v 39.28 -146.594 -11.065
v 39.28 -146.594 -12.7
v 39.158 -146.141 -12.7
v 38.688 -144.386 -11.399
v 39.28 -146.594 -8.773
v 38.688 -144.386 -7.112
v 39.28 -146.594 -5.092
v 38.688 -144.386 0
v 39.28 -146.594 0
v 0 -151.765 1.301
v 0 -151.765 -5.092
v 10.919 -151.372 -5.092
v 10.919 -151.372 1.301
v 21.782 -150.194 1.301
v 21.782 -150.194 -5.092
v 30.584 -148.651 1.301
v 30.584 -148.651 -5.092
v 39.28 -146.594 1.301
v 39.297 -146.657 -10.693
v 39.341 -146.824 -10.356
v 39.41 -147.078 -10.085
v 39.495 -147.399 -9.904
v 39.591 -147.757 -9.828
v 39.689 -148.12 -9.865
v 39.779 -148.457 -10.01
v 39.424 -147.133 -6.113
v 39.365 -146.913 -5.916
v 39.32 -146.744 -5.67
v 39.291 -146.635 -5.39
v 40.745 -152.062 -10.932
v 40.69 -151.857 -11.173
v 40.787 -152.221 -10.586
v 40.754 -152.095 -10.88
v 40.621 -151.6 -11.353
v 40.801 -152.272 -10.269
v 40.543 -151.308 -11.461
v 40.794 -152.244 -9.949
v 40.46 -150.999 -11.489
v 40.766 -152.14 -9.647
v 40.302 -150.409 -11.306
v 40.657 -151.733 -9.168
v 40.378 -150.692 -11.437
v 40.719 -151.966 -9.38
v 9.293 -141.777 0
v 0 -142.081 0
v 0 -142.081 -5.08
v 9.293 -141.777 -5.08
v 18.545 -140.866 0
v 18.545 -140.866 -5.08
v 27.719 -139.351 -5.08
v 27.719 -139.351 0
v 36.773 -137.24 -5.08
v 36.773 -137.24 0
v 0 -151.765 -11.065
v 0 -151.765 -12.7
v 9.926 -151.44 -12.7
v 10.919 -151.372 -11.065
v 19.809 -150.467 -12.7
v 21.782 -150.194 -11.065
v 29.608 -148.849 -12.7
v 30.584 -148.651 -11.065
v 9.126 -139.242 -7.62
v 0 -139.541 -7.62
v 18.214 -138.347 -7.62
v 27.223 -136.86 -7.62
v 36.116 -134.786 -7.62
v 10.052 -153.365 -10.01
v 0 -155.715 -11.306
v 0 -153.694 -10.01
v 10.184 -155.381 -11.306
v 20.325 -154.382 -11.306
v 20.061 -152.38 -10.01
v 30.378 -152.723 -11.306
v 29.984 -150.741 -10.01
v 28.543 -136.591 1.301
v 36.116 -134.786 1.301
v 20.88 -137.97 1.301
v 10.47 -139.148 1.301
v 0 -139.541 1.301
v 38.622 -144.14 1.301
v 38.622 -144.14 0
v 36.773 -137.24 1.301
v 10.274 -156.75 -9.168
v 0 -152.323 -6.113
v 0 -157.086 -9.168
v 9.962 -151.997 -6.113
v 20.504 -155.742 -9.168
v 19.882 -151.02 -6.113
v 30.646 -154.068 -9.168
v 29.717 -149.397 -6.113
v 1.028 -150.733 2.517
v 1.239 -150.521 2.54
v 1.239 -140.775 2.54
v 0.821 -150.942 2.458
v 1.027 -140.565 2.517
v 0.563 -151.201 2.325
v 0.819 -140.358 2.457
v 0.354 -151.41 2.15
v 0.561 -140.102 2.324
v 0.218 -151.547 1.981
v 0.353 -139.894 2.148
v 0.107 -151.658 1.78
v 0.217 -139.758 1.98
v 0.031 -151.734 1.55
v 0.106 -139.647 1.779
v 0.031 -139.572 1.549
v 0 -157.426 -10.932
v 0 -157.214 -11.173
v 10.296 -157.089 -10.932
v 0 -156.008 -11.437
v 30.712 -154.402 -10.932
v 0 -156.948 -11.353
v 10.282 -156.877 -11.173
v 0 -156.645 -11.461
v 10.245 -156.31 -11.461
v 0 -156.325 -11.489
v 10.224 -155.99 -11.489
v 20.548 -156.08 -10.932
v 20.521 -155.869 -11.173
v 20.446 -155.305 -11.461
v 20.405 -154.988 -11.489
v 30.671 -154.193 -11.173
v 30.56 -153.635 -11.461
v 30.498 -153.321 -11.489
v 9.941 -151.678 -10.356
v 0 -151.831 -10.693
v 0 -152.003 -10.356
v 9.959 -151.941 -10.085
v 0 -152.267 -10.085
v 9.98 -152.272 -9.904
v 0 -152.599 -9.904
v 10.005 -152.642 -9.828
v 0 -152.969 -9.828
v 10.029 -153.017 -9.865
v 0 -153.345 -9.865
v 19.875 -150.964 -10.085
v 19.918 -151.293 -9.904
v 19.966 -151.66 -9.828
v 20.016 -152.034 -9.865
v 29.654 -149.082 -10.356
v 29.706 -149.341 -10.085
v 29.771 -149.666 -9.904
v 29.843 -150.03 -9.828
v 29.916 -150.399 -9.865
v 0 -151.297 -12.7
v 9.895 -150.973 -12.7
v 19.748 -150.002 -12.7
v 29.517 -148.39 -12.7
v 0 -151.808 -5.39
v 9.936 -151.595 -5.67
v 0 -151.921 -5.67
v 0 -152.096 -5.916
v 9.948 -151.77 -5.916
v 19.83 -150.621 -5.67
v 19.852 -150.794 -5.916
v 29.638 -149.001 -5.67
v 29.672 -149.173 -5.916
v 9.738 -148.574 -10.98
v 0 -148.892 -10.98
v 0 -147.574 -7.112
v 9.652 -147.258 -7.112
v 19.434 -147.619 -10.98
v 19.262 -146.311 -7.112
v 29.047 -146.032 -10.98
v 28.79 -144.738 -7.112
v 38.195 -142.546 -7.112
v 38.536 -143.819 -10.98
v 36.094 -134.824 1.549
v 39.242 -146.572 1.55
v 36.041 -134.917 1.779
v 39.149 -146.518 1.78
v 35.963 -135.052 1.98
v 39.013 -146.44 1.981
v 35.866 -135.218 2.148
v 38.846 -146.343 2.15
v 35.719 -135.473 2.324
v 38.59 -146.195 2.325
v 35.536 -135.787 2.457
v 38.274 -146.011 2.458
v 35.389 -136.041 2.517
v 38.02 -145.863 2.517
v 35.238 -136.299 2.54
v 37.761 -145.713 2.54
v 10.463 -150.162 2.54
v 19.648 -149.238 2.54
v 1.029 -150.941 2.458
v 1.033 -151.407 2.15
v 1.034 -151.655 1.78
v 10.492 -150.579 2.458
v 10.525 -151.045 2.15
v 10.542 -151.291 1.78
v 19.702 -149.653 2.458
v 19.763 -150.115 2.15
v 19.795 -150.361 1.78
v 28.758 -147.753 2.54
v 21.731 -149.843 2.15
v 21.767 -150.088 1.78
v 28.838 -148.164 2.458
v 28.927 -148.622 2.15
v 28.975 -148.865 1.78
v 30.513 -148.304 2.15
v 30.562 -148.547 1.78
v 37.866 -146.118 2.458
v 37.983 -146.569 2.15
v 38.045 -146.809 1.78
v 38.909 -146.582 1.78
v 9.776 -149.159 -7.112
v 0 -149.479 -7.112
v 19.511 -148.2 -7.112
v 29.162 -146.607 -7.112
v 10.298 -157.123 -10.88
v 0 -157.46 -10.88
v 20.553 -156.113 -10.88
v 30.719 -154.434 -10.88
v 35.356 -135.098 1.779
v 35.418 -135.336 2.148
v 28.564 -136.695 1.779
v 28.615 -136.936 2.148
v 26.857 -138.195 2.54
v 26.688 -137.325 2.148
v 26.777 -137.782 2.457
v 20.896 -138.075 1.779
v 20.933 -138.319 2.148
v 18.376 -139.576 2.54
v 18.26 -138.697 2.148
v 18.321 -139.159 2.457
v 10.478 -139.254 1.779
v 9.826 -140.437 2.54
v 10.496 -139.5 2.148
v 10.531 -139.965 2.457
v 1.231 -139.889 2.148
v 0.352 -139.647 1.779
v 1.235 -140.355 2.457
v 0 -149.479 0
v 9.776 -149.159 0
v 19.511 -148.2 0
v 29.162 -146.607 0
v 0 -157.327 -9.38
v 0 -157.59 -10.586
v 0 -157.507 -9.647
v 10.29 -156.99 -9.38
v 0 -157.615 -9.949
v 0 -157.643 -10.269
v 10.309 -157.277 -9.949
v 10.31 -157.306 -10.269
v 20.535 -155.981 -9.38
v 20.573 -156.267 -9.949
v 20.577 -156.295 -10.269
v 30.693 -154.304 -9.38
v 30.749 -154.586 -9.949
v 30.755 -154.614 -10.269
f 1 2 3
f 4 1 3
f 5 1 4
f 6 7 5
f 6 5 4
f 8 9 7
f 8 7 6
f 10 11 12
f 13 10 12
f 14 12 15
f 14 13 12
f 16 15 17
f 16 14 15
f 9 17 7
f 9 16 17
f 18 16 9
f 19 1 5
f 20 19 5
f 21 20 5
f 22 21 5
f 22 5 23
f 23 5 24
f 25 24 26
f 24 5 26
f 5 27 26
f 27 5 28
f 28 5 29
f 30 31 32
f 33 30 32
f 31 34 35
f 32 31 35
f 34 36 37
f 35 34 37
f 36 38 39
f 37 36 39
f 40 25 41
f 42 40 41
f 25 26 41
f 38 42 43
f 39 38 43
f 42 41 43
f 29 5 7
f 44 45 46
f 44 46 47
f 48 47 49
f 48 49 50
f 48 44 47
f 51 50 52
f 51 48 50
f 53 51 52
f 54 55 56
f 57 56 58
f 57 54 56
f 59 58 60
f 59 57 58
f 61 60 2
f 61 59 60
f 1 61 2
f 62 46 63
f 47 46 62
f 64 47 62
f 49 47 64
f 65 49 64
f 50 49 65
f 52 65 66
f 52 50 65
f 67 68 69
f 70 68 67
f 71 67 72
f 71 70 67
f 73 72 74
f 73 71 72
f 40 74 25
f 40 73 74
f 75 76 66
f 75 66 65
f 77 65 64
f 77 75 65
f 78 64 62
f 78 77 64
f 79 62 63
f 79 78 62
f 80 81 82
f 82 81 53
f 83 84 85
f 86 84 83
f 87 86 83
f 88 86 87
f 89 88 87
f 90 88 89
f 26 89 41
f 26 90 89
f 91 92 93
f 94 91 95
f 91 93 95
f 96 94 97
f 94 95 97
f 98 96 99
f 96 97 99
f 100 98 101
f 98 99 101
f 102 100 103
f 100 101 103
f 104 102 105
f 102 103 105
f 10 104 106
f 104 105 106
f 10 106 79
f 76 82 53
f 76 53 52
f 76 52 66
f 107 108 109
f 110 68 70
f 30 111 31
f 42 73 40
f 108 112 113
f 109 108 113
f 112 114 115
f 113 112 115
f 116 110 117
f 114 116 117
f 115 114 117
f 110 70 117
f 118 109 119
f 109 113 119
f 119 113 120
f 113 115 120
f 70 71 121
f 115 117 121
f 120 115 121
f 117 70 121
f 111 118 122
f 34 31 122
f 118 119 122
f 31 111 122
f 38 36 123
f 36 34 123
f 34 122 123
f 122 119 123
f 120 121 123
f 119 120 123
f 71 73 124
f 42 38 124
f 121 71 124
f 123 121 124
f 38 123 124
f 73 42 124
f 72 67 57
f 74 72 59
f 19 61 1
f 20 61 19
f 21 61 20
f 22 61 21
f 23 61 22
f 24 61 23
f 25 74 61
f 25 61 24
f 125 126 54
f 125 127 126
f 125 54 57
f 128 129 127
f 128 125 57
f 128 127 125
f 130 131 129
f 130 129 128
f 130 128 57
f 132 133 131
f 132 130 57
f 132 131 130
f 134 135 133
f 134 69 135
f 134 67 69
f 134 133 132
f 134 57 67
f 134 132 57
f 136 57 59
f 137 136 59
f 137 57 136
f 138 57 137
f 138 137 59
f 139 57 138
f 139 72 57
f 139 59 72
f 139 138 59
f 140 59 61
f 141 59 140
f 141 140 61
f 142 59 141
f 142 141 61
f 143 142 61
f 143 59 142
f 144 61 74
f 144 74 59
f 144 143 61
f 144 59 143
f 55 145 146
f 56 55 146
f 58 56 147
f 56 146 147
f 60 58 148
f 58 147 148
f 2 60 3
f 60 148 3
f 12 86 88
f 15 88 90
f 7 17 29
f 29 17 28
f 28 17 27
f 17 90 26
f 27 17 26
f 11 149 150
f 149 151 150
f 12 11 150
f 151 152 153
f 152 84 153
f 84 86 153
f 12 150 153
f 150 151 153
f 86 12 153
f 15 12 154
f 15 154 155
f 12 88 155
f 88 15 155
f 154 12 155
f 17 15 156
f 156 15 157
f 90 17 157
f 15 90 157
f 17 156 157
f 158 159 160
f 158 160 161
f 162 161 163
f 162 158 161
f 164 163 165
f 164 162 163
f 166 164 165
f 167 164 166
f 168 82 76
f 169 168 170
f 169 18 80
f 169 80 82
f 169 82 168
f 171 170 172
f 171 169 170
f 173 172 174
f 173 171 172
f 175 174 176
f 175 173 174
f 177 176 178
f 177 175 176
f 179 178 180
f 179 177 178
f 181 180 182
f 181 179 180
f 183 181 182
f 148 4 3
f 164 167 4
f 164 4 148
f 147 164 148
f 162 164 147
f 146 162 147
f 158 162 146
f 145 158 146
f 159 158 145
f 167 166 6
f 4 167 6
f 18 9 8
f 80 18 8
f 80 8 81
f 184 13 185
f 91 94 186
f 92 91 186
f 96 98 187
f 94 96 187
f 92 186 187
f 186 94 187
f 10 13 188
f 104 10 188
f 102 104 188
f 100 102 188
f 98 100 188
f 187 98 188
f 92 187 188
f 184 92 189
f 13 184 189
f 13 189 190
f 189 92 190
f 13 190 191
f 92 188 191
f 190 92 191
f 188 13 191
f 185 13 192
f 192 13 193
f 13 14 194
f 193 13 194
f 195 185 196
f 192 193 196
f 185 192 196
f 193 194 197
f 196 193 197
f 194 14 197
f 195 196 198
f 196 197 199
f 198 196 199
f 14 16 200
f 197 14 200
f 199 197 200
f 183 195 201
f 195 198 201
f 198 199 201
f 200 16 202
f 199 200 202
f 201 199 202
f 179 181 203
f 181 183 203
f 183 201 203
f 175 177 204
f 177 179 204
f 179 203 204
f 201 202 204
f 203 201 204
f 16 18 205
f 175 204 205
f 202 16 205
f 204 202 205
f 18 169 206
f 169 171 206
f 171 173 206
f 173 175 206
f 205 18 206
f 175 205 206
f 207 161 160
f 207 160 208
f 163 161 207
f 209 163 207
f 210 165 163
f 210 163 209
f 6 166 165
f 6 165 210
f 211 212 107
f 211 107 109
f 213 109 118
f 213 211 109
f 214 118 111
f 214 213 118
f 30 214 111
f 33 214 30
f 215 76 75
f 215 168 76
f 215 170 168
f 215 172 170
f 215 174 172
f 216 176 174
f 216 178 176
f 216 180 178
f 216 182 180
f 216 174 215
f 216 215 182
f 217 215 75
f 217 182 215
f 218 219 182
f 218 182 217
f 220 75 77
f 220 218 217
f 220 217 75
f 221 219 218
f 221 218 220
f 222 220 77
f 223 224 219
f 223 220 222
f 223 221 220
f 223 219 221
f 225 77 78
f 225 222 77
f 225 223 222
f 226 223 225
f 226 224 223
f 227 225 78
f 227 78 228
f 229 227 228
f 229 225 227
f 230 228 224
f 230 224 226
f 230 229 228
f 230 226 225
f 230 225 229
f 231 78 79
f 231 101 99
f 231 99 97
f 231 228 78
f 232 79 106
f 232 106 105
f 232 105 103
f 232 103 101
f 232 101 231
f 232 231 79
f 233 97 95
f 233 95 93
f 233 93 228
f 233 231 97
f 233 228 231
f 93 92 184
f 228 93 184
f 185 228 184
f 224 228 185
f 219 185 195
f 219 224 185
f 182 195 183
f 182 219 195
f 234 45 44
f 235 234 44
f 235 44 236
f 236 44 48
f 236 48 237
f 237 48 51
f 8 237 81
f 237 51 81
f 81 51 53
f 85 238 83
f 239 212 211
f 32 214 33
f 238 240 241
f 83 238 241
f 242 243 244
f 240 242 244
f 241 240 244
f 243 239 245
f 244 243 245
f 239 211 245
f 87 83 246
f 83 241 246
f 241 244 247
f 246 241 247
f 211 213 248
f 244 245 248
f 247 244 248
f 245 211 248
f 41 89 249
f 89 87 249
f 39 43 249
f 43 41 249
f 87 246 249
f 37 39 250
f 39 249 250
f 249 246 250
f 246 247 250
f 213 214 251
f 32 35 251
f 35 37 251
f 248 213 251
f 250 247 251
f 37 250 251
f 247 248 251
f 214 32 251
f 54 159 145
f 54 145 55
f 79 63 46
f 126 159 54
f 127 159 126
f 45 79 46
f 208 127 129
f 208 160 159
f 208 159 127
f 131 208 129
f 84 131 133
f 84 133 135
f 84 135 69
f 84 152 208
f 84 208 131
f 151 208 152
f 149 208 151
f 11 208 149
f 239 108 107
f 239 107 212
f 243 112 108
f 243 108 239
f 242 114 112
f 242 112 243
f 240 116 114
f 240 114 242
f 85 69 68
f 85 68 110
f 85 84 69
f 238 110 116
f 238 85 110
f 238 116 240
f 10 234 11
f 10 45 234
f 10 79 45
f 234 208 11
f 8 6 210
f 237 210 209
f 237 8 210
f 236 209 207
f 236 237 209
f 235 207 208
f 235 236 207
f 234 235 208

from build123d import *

# Parameters (mm, degrees)
F2_DEPTH      = 2.54
F3_DEPTH      = 7.62
F5_DEPTH      = 12.7
F7_ANGLE      = 15
F8_T2_ANGLE   = 20.2683164311
F8_T4_ANGLE   = 18.6436758241
F10_ANGLE     = 15
F11_T2_ANGLE  = 15
F11_T4_ANGLE  = 15
F11_T5_DEPTH  = 18.5785787418
F11_T7_DEPTH  = 18.5785787418
F11_T10_ANGLE = 17.3026091046
F11_T12_ANGLE = 17.3227523422
F11_T14_ANGLE = 17.3991627069
F11_T16_ANGLE = 17.6093282682


# Not quite as in the source:
# - a fillet or chamfer that OpenCascade refuses, or shapes differently, is made with other operations: its cross-section is extruded or revolved along the edge and cut away or added


with BuildPart() as f2:
    # F1 (on Top) → F2 (new body)
    with BuildSketch(Plane.XY):
        with BuildLine():
            ThreePointArc((36.1159330774, -134.7864972077), (18.2137880201, -138.3474552622), (0, -139.54125))
            Line((0, -139.54125), (0, -142.08125))
            ThreePointArc((0, -142.08125), (18.5453245484, -140.8657252101), (36.773333452, -137.2399488064))
            Line((36.773333452, -137.2399488064), (36.1159330774, -134.7864972077))
        make_face()
        with BuildLine():
            ThreePointArc((36.773333452, -137.2399488064), (18.5453245484, -140.8657252101), (0, -142.08125))
            Line((0, -142.08125), (0, -149.225))
            ThreePointArc((0, -149.225), (19.477771034, -147.9483594385), (38.6222720054, -144.140281428))
            Line((38.6222720054, -144.140281428), (36.773333452, -137.2399488064))
        make_face()
        with BuildLine():
            ThreePointArc((38.6222720054, -144.140281428), (19.477771034, -147.9483594385), (0, -149.225))
            Line((0, -149.225), (0, -151.765))
            ThreePointArc((0, -151.765), (19.8093075623, -150.4666293864), (39.27967238, -146.5937330268))
            Line((39.27967238, -146.5937330268), (38.6222720054, -144.140281428))
        make_face()
    extrude(amount=F2_DEPTH)

    # F1 (on Top) → F3 (join)
    with BuildSketch(Plane.XY):
        with BuildLine():
            ThreePointArc((36.1159330774, -134.7864972077), (18.2137880201, -138.3474552622), (0, -139.54125))
            Line((0, -139.54125), (0, -142.08125))
            ThreePointArc((0, -142.08125), (18.5453245484, -140.8657252101), (36.773333452, -137.2399488064))
            Line((36.773333452, -137.2399488064), (36.1159330774, -134.7864972077))
        make_face()
    extrude(amount=-F3_DEPTH)

    # F4 (on face) → F5 (join)
    with BuildSketch(Plane.XY):
        with BuildLine():
            ThreePointArc((38.6880120429, -144.3856265879), (19.5109246869, -148.2001864333), (0, -149.479))
            Line((0, -149.479), (0, -151.765))
            ThreePointArc((0, -151.765), (19.8093075623, -150.4666293864), (39.27967238, -146.5937330268))
            Line((39.27967238, -146.5937330268), (38.6880120429, -144.3856265879))
        make_face()
    extrude(amount=-F5_DEPTH)

    # F6 (on face) → F7 (revolve)
    with BuildSketch(Plane(origin=(0, 0, 0), x_dir=(0, -1, 0), z_dir=(-1, 0, 0))):
        Polygon((147.574, -7.112), (149.479, -12.7), (149.479, -7.112), align=None)
    revolve(axis=Axis((0, 0, 0), (0, 0, 1)), revolution_arc=F7_ANGLE)

    # F8: chamfer of 2.54 on 2 edges, made by hand

    # F8_s1 → F8_t2 (revolve, cut)
    with BuildSketch(Plane(origin=(0, 0, 0), x_dir=(0, 0, 1), z_dir=(-0.9989433481, 0.0459585396, 0))):
        Polygon((-7.62, -139.54125), (-5.08, -142.08125), (-7.62, -142.08125), align=None)
    revolve(axis=Axis((0, 0, -7.62), (0, 0, 1)), revolution_arc=F8_T2_ANGLE, mode=Mode.SUBTRACT)

    # F8_s3 → F8_t4 (revolve, cut)
    with BuildSketch(Plane(origin=(0, 0, 0), x_dir=(0, 0, 1), z_dir=(0.9572092654, 0.289396652, 0))):
        Polygon((-12.7, 151.2966330745), (-10.9795917766, 148.8924971966), (-12.7, 149.479), align=None)
    revolve(axis=Axis((0, 0, -12.7), (0, 0, -1)), revolution_arc=F8_T4_ANGLE, mode=Mode.SUBTRACT)

    # F9 (on face) → F10 (revolve)
    with BuildSketch(Plane(origin=(0, 0, 0), x_dir=(0, -1, 0), z_dir=(-1, 0, 0))):
        Polygon((158.1288493504, -9.8370487633), (151.765, -5.7552899175), (151.765, -8.7728602812), (156.7575335503, -11.9750602171), align=None)
        Polygon((151.765, -8.7728602812), (151.765, -5.7552899175), (151.765, 2.54), (139.54125, 2.54), (139.54125, -7.62), (142.08125, -5.08), (142.08125, 0), (149.479, 0), (149.479, -7.112), (147.574, -7.112), (148.8924971966, -10.9795917766), (151.2966330745, -12.7), (151.765, -12.7), align=None)
    revolve(axis=Axis((0, 0, 0), (0, 0, 1)), revolution_arc=F10_ANGLE)

    # F11: fillet of radius 1.27 on 8 edges, made by hand

    # F11_s1 → F11_t2 (revolve)
    with BuildSketch(Plane.YZ):
        with BuildLine():
            ThreePointArc((-151.7646, -5.0599866722), (-151.9205140931, -5.6702824854), (-152.3500463685, -6.1310125674))
            Line((-152.3500463685, -6.1310125674), (-152.2813510053, -6.2381151569))
            ThreePointArc((-152.2813510053, -6.2381151569), (-151.9889357987, -6.0500854846), (-151.6963046368, -5.862392507))
            Line((-151.6963046368, -5.862392507), (-151.63776, -5.7552899175))
            ThreePointArc((-151.63776, -5.7552899175), (-151.63776, -5.4076382949), (-151.63736, -5.0599866722))
            Line((-151.63736, -5.0599866722), (-151.7646, -5.0599866722))
        make_face()
    revolve(axis=Axis((0, 0, -5.7552899175), (0, 0, 1)), revolution_arc=F11_T2_ANGLE)

    # F11_s3 → F11_t4 (revolve)
    with BuildSketch(Plane.YZ):
        with BuildLine():
            ThreePointArc((-151.7646, -11.0968951513), (-152.4258553263, -9.9818406517), (-153.7214416132, -10.0272423808))
            Line((-153.7214416132, -10.0272423808), (-153.7900489045, -9.9202771037))
            ThreePointArc((-153.7900489045, -9.9202771037), (-152.8117201202, -9.2932544013), (-151.8336072912, -8.6658950041))
            Line((-151.8336072912, -8.6658950041), (-151.6379231299, -8.7728602812))
            ThreePointArc((-151.6379231299, -8.7728602812), (-151.6379231299, -9.9348777163), (-151.6375231299, -11.0968951513))
            Line((-151.6375231299, -11.0968951513), (-151.7646, -11.0968951513))
        make_face()
    revolve(axis=Axis((0, 0, -8.7728602812), (0, 0, 1)), revolution_arc=F11_T4_ANGLE)

    # F11_s6 → F11_t5 (cut)
    with BuildSketch(Plane.XZ.offset(136.3638356291)):
        with BuildLine():
            ThreePointArc((1.2709656854, 2.5404), (0.3719743879, 2.1680256121), (-0.0004, 1.2690343146))
            Line((-0.0004, 1.2690343146), (-0.1275365685, 1.2690343146))
            ThreePointArc((-0.1275365685, 1.2690343146), (-0.1271365685, 1.9045171573), (-0.1271365685, 2.54))
            Line((-0.1271365685, 2.54), (0, 2.6671365685))
            ThreePointArc((0, 2.6671365685), (0.6354828427, 2.6671365685), (1.2709656854, 2.6675365685))
            Line((1.2709656854, 2.6675365685), (1.2709656854, 2.5404))
        make_face()
    extrude(amount=F11_T5_DEPTH, mode=Mode.SUBTRACT)

    # F11_s8 → F11_t7 (cut)
    with BuildSketch(Plane(origin=(40.1020477334, -149.6628796285, 0), x_dir=(0, 0, 1), z_dir=(-0.2588190451, 0.9659258263, 0))):
        with BuildLine():
            ThreePointArc((1.2690343146, 0.0004), (2.1680256121, -0.3719743879), (2.5404, -1.2709656854))
            Line((2.5404, -1.2709656854), (2.6675365685, -1.2709656854))
            ThreePointArc((2.6675365685, -1.2709656854), (2.6671365685, -0.6354828427), (2.6671365685, 0))
            Line((2.6671365685, 0), (2.54, 0.1271365685))
            ThreePointArc((2.54, 0.1271365685), (1.9045171573, 0.1271365685), (1.2690343146, 0.1275365685))
            Line((1.2690343146, 0.1275365685), (1.2690343146, 0.0004))
        make_face()
    extrude(amount=F11_T7_DEPTH, mode=Mode.SUBTRACT)

    # F11_s9 → F11_t10 (revolve, cut)
    with BuildSketch(Plane(origin=(0, 0, 0), x_dir=(0, 0, 1), z_dir=(-0.9997981213, 0.0200927029, 0))):
        with BuildLine():
            ThreePointArc((-9.1505328065, -157.0592467258), (-9.9493287423, -157.6149202728), (-10.9070832984, -157.443006783))
            Line((-10.9070832984, -157.443006783), (-10.9757228201, -157.5500223104))
            ThreePointArc((-10.9757228201, -157.5500223104), (-10.440597575, -157.8927752468), (-9.9056882851, -158.2358648778))
            Line((-9.9056882851, -158.2358648778), (-9.7300332359, -158.1974888721))
            ThreePointArc((-9.7300332359, -158.1974888721), (-9.3869436048, -157.6625795822), (-9.043517279, -157.1278862476))
            Line((-9.043517279, -157.1278862476), (-9.1505328065, -157.0592467258))
        make_face()
    revolve(axis=Axis((0, 0, -9.8370487633), (0, 0, 1)), revolution_arc=F11_T10_ANGLE, mode=Mode.SUBTRACT)

    # F11_s11 → F11_t12 (revolve, cut)
    with BuildSketch(Plane(origin=(0, 0, 0), x_dir=(0, 0, 1), z_dir=(-0.9997945739, 0.02026845, 0))):
        with BuildLine():
            ThreePointArc((-10.9054575925, -157.4440495071), (-11.4611311395, -156.6452535713), (-11.2892176497, -155.6874990152))
            Line((-11.2892176497, -155.6874990152), (-11.3962331771, -155.6188594935))
            ThreePointArc((-11.3962331771, -155.6188594935), (-11.7389861135, -156.1539847386), (-12.0820757445, -156.6888940285))
            Line((-12.0820757445, -156.6888940285), (-12.0436997388, -156.8645490777))
            ThreePointArc((-12.0436997388, -156.8645490777), (-11.5087904489, -157.2076387088), (-10.9740971142, -157.5510650346))
            Line((-10.9740971142, -157.5510650346), (-10.9054575925, -157.4440495071))
        make_face()
    revolve(axis=Axis((0, 0, -11.9750602171), (0, 0, 1)), revolution_arc=F11_T12_ANGLE, mode=Mode.SUBTRACT)

    # F11_s13 → F11_t14 (revolve, cut)
    with BuildSketch(Plane(origin=(0, 0, 0), x_dir=(0, 0, 1), z_dir=(-0.9997808365, 0.0209351147, 0))):
        with BuildLine():
            ThreePointArc((2.5404, -150.4940343146), (2.1680256121, -151.3930256121), (1.2690343146, -151.7654))
            Line((1.2690343146, -151.7654), (1.2690343146, -151.8925365685))
            ThreePointArc((1.2690343146, -151.8925365685), (1.9045171573, -151.8921365685), (2.54, -151.8921365685))
            Line((2.54, -151.8921365685), (2.6671365685, -151.765))
            ThreePointArc((2.6671365685, -151.765), (2.6671365685, -151.1295171573), (2.6675365685, -150.4940343146))
            Line((2.6675365685, -150.4940343146), (2.5404, -150.4940343146))
        make_face()
    revolve(axis=Axis((0, 0, 2.54), (0, 0, 1)), revolution_arc=F11_T14_ANGLE, mode=Mode.SUBTRACT)

    # F11_s15 → F11_t16 (revolve, cut)
    with BuildSketch(Plane(origin=(0, 0, 0), x_dir=(0, 0, 1), z_dir=(0.9597824413, 0.2807448405, 0))):
        with BuildLine():
            ThreePointArc((1.2690343146, 139.54085), (2.1680256121, 139.9132243879), (2.5404, 140.8122156854))
            Line((2.5404, 140.8122156854), (2.6675365685, 140.8122156854))
            ThreePointArc((2.6675365685, 140.8122156854), (2.6671365685, 140.1767328427), (2.6671365685, 139.54125))
            Line((2.6671365685, 139.54125), (2.54, 139.4141134315))
            ThreePointArc((2.54, 139.4141134315), (1.9045171573, 139.4141134315), (1.2690343146, 139.4137134315))
            Line((1.2690343146, 139.4137134315), (1.2690343146, 139.54085))
        make_face()
    revolve(axis=Axis((0, 0, 2.54), (0, 0, -1)), revolution_arc=F11_T16_ANGLE, mode=Mode.SUBTRACT)


solid = f2.part
